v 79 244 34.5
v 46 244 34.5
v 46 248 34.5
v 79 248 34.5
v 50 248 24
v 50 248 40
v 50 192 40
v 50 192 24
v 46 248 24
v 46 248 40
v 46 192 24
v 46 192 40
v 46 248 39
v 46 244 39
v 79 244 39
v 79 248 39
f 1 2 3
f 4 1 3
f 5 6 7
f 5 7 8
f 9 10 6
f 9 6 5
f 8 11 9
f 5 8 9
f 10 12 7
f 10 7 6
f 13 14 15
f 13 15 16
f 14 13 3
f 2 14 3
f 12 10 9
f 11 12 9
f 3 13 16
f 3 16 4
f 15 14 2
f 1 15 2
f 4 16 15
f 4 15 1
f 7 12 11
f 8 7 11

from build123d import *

# Parameters (mm, degrees)
COLUMN_START       = 46
SKETCH1_W          = 16
SKETCH1_H          = 56
COLUMN_DEPTH       = 4
ANCHOR_PLATE_START = 46
SKETCH2_W          = 4.5
SKETCH2_H          = 4
ANCHOR_PLATE_DEPTH = 33


with BuildPart() as part:
    # Sketch1 → column (new body)
    with BuildSketch(Plane(origin=(0, 0, 0), x_dir=(0, 0, -1), z_dir=(1, 0, 0)).offset(COLUMN_START)):
        with Locations((-32, 220)):
            Rectangle(SKETCH1_W, SKETCH1_H)
    extrude(amount=COLUMN_DEPTH)


with BuildPart() as body_2:
    # Sketch2 → anchor_plate (new body)
    with BuildSketch(Plane(origin=(0, 0, 0), x_dir=(0, 0, -1), z_dir=(1, 0, 0)).offset(ANCHOR_PLATE_START)):
        with Locations((-36.75, 246)):
            Rectangle(SKETCH2_W, SKETCH2_H)
    extrude(amount=ANCHOR_PLATE_DEPTH)


solid = Compound([part.part, body_2.part])
